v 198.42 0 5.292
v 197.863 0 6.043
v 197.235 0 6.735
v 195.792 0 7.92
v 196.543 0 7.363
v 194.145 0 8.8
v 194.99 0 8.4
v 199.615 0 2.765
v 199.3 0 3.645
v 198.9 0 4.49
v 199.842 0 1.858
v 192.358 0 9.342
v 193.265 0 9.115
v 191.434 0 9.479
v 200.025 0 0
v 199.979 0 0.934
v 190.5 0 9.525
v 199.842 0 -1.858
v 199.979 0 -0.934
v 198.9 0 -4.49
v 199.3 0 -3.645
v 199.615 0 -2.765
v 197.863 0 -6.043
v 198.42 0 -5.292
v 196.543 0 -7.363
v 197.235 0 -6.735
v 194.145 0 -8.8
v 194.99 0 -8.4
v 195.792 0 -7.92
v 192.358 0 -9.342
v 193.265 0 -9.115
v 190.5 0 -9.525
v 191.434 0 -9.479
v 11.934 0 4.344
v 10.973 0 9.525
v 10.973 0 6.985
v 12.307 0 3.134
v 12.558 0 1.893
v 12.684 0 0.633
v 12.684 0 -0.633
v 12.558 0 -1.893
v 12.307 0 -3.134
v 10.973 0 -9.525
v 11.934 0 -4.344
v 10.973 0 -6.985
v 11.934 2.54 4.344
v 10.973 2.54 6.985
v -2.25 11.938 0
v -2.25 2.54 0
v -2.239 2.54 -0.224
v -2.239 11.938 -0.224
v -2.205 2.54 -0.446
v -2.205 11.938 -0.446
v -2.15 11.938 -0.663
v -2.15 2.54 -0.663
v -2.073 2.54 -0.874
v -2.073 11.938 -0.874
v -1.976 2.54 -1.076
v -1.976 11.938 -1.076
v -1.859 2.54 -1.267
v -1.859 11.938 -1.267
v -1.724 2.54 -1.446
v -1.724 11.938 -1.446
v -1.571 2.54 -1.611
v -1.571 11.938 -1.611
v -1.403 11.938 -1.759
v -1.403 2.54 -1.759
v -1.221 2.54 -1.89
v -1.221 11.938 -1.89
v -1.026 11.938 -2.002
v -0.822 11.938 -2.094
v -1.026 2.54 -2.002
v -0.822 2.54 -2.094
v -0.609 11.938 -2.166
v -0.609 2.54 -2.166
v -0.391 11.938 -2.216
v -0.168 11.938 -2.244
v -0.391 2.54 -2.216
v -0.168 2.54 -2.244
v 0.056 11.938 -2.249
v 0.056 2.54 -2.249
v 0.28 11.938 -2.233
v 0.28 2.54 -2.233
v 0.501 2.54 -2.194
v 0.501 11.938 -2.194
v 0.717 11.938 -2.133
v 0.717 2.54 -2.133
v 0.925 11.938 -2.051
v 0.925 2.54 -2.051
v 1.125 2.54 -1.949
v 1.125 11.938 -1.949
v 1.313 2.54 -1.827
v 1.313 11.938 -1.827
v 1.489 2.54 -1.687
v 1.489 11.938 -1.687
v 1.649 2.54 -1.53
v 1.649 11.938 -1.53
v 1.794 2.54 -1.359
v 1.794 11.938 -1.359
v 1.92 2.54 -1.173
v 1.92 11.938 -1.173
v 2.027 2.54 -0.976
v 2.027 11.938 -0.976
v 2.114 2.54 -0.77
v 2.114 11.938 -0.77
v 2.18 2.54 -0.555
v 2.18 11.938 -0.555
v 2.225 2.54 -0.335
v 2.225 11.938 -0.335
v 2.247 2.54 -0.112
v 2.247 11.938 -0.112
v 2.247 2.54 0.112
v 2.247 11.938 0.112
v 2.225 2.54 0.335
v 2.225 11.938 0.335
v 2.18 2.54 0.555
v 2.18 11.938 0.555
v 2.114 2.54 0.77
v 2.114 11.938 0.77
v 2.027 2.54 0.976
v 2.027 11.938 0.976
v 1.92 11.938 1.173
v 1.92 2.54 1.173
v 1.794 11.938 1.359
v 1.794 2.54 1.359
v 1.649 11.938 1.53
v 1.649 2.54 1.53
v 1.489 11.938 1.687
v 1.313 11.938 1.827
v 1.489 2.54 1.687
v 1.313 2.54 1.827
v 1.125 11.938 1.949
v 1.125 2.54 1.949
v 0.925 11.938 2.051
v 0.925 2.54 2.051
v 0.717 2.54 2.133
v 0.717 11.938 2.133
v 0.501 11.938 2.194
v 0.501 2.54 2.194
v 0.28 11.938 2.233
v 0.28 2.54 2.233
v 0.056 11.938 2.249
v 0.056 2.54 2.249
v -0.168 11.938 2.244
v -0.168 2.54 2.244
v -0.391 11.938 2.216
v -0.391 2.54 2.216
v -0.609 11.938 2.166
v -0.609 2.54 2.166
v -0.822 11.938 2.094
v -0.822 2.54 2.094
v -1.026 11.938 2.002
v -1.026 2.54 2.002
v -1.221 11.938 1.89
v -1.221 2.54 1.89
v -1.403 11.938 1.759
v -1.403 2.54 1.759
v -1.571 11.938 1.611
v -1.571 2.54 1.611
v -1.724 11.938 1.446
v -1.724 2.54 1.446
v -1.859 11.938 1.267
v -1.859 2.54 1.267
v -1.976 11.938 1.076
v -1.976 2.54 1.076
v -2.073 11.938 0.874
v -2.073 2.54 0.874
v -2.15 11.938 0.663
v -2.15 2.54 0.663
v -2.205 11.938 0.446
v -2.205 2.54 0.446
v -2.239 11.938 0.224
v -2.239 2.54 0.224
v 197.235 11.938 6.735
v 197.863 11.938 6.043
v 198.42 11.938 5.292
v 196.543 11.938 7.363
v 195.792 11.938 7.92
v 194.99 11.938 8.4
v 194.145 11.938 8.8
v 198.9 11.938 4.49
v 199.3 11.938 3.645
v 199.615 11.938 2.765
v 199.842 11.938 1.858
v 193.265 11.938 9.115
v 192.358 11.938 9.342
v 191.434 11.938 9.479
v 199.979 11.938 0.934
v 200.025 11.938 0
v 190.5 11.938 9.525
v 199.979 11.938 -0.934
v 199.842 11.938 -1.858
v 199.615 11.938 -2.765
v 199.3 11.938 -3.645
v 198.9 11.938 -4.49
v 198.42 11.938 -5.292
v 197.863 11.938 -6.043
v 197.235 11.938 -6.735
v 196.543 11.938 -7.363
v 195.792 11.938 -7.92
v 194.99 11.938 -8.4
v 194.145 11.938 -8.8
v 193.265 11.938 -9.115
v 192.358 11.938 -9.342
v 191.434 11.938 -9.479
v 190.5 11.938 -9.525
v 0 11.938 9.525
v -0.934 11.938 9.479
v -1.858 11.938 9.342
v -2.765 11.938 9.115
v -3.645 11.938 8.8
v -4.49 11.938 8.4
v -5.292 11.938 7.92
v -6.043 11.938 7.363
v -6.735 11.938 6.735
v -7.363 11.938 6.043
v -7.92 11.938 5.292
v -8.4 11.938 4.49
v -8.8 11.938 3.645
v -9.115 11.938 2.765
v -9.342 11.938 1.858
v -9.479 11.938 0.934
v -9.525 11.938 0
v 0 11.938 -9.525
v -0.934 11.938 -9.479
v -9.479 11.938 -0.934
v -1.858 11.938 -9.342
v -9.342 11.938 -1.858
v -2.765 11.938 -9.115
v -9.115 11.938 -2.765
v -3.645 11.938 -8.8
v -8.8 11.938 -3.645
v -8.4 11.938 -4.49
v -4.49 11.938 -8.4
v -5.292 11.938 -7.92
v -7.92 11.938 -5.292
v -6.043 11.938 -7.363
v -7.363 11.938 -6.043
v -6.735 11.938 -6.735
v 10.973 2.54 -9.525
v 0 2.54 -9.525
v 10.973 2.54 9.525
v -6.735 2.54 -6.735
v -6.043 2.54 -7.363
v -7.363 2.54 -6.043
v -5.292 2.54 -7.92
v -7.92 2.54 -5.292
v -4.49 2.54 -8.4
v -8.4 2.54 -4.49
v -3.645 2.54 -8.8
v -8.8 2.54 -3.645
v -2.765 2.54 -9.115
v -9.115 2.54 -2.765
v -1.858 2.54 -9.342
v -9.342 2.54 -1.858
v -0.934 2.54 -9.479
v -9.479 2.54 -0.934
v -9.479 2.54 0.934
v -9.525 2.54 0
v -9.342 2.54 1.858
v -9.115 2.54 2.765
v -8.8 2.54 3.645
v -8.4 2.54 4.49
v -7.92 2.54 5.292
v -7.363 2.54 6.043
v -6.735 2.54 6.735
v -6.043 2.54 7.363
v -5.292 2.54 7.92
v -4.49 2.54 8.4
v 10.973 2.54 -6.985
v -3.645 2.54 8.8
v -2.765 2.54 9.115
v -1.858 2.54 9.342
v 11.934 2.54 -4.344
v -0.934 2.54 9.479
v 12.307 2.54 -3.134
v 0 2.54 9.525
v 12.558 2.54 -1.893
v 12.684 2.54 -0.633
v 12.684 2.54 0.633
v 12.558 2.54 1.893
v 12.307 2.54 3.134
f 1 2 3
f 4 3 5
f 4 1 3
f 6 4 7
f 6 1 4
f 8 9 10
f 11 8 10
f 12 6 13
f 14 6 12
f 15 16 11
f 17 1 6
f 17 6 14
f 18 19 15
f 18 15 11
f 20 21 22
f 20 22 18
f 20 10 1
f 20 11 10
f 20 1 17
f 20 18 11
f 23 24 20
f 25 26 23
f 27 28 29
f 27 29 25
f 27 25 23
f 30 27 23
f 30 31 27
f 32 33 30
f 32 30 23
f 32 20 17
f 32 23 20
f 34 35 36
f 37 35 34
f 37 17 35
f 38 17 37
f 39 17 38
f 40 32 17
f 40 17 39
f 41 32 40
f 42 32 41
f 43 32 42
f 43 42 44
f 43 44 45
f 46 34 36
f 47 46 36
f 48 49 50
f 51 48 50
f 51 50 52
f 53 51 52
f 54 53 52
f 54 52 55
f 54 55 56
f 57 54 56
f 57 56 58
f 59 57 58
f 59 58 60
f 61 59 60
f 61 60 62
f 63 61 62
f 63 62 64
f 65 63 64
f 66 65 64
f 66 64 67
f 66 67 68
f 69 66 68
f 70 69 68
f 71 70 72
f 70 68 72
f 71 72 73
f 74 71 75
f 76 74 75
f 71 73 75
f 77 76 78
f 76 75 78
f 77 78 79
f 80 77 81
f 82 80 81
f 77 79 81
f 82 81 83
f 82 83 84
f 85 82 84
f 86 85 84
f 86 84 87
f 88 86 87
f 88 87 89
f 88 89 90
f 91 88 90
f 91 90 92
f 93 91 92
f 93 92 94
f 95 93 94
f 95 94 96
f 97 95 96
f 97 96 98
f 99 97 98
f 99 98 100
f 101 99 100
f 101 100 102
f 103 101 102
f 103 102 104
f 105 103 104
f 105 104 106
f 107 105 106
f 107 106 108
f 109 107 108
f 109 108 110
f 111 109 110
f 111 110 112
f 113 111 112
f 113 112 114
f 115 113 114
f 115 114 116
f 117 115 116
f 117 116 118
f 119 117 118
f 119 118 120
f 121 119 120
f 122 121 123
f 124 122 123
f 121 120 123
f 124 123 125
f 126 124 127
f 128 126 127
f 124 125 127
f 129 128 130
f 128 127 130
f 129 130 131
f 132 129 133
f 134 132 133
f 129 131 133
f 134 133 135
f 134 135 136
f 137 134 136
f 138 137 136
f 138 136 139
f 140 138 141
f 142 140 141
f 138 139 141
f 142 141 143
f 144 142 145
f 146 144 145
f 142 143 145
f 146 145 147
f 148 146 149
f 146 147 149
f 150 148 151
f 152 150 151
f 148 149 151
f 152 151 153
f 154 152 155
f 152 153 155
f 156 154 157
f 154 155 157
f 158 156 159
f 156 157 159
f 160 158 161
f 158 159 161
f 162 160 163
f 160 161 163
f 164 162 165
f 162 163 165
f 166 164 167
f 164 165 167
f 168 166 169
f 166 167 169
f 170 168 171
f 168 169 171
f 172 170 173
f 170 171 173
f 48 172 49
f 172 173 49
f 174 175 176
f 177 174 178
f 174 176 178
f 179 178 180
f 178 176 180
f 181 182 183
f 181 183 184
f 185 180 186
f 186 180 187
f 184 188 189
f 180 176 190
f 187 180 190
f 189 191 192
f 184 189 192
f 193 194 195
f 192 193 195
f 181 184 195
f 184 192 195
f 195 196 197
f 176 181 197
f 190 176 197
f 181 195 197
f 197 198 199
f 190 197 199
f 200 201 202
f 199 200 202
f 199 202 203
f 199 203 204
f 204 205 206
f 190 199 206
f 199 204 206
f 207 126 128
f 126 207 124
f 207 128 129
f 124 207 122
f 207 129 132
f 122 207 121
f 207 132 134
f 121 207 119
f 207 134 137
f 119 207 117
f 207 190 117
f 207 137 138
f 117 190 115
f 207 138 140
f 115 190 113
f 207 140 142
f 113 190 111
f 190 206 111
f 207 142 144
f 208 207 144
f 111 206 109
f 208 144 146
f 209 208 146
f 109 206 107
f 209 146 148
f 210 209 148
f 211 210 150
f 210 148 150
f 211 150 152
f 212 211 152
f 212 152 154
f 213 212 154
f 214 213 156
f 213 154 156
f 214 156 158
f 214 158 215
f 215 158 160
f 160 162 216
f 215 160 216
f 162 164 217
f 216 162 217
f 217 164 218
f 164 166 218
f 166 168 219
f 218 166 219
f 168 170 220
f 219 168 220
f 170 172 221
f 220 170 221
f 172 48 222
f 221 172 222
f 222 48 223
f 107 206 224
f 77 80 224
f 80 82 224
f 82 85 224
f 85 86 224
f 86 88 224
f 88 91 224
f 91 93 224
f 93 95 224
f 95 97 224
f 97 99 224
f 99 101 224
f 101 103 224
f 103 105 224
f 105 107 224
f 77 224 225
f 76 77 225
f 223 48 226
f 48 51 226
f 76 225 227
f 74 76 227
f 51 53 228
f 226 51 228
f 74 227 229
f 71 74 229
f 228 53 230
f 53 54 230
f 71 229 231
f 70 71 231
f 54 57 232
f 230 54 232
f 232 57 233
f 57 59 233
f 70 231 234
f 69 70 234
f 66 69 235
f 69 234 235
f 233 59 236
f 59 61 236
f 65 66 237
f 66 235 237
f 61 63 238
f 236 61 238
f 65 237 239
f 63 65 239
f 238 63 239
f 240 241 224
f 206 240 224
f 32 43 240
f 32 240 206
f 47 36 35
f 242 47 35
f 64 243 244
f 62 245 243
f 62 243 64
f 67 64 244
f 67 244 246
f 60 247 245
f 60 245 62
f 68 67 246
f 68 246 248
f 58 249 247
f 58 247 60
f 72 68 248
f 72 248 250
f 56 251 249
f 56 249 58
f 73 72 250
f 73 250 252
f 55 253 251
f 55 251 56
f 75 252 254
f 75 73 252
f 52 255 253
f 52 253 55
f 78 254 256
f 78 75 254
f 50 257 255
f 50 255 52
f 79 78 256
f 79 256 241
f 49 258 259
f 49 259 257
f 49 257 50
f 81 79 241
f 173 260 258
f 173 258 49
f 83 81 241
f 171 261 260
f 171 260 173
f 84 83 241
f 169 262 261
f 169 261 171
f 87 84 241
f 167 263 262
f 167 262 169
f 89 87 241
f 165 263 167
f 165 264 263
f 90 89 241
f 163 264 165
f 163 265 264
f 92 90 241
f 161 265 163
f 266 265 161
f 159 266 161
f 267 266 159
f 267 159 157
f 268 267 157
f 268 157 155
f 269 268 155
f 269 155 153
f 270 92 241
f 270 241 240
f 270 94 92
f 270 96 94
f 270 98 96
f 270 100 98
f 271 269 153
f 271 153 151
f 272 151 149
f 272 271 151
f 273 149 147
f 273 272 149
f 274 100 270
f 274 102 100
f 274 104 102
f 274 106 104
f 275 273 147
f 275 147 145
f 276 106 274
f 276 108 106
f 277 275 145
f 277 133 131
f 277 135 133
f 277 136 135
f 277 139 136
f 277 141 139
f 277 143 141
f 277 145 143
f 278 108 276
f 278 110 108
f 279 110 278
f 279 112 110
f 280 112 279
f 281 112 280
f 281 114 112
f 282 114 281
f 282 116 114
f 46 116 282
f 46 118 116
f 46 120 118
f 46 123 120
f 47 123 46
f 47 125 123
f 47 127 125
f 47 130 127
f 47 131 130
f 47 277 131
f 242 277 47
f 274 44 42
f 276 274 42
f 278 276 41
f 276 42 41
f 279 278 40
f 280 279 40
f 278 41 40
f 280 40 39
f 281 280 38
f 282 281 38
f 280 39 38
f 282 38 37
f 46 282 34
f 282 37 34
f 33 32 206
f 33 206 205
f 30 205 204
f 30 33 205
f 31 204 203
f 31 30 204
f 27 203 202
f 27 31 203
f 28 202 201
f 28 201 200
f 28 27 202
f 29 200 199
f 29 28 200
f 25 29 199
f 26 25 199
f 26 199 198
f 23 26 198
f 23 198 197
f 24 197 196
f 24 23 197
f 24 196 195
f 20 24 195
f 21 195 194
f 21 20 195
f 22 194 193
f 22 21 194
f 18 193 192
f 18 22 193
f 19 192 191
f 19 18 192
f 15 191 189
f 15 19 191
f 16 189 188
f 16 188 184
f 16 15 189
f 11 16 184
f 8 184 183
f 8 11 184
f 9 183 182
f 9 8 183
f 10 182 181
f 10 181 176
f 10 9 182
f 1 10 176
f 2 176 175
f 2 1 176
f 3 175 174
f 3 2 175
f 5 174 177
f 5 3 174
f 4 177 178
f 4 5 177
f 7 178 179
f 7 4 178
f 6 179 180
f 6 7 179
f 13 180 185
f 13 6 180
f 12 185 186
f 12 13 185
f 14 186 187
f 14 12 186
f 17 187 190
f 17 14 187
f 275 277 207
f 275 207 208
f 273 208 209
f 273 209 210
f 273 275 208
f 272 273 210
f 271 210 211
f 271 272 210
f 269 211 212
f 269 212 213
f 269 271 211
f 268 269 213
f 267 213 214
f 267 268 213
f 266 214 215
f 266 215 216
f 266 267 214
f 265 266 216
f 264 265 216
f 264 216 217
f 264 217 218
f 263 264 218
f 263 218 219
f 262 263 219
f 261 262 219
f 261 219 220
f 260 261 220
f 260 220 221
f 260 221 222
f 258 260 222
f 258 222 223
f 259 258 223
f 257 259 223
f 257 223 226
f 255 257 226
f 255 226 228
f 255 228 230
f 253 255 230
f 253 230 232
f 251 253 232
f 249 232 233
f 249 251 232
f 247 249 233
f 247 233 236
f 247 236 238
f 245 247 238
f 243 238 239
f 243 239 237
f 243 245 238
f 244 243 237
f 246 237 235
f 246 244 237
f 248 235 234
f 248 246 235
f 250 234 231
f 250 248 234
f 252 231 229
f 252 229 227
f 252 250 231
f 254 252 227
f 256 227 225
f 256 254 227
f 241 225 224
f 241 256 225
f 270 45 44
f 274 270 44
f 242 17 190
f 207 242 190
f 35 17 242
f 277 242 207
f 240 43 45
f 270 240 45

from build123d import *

# Parameters (mm, degrees)
BOSS_EXTRUDE1_DEPTH        = 11.938
F_4_5_4_5_DIAMETER_HOLE1_D = 4.5
CUT_EXTRUDE1_DEPTH         = 2.54


with BuildPart() as part:
    # Sketch1 → Boss-Extrude1 (new body)
    with BuildSketch(Plane(origin=(0, 0, 0), x_dir=(1, 0, 0), z_dir=(0, 1, 0))):
        with BuildLine():
            Line((0, 9.525), (190.5, 9.525))
            ThreePointArc((190.5, 9.525), (200.025, 0), (190.5, -9.525))
            Line((190.5, -9.525), (0, -9.525))
            ThreePointArc((0, -9.525), (-9.525, 0), (0, 9.525))
        make_face()
    extrude(amount=BOSS_EXTRUDE1_DEPTH)

    # Ø4.5 (4.5) Diameter Hole1 (through all)
    with Locations(Plane(origin=(0, 11.938, 0), x_dir=(1, 0, 0), z_dir=(0, 1, 0))):
        with Locations((0, 0)):
            Hole(F_4_5_4_5_DIAMETER_HOLE1_D / 2)

    # Sketch5 → Cut-Extrude1 (cut)
    with BuildSketch(Plane.XZ):
        with BuildLine():
            Line((10.972725624, 9.525), (0, 9.525))
            ThreePointArc((0, 9.525), (-9.525, 0), (0, -9.525))
            Line((0, -9.525), (10.972725624, -9.525))
            Line((10.972725624, -9.525), (10.972725624, -6.985))
            Line((10.972725624, -6.985), (11.934096284, -4.34365582))
            ThreePointArc((11.934096284, -4.34365582), (12.7, 0), (11.934096284, 4.34365582))
            Line((11.934096284, 4.34365582), (10.972725624, 6.985))
            Line((10.972725624, 6.985), (10.972725624, 9.525))
        make_face()
    extrude(amount=-CUT_EXTRUDE1_DEPTH, mode=Mode.SUBTRACT)


solid = part.part
